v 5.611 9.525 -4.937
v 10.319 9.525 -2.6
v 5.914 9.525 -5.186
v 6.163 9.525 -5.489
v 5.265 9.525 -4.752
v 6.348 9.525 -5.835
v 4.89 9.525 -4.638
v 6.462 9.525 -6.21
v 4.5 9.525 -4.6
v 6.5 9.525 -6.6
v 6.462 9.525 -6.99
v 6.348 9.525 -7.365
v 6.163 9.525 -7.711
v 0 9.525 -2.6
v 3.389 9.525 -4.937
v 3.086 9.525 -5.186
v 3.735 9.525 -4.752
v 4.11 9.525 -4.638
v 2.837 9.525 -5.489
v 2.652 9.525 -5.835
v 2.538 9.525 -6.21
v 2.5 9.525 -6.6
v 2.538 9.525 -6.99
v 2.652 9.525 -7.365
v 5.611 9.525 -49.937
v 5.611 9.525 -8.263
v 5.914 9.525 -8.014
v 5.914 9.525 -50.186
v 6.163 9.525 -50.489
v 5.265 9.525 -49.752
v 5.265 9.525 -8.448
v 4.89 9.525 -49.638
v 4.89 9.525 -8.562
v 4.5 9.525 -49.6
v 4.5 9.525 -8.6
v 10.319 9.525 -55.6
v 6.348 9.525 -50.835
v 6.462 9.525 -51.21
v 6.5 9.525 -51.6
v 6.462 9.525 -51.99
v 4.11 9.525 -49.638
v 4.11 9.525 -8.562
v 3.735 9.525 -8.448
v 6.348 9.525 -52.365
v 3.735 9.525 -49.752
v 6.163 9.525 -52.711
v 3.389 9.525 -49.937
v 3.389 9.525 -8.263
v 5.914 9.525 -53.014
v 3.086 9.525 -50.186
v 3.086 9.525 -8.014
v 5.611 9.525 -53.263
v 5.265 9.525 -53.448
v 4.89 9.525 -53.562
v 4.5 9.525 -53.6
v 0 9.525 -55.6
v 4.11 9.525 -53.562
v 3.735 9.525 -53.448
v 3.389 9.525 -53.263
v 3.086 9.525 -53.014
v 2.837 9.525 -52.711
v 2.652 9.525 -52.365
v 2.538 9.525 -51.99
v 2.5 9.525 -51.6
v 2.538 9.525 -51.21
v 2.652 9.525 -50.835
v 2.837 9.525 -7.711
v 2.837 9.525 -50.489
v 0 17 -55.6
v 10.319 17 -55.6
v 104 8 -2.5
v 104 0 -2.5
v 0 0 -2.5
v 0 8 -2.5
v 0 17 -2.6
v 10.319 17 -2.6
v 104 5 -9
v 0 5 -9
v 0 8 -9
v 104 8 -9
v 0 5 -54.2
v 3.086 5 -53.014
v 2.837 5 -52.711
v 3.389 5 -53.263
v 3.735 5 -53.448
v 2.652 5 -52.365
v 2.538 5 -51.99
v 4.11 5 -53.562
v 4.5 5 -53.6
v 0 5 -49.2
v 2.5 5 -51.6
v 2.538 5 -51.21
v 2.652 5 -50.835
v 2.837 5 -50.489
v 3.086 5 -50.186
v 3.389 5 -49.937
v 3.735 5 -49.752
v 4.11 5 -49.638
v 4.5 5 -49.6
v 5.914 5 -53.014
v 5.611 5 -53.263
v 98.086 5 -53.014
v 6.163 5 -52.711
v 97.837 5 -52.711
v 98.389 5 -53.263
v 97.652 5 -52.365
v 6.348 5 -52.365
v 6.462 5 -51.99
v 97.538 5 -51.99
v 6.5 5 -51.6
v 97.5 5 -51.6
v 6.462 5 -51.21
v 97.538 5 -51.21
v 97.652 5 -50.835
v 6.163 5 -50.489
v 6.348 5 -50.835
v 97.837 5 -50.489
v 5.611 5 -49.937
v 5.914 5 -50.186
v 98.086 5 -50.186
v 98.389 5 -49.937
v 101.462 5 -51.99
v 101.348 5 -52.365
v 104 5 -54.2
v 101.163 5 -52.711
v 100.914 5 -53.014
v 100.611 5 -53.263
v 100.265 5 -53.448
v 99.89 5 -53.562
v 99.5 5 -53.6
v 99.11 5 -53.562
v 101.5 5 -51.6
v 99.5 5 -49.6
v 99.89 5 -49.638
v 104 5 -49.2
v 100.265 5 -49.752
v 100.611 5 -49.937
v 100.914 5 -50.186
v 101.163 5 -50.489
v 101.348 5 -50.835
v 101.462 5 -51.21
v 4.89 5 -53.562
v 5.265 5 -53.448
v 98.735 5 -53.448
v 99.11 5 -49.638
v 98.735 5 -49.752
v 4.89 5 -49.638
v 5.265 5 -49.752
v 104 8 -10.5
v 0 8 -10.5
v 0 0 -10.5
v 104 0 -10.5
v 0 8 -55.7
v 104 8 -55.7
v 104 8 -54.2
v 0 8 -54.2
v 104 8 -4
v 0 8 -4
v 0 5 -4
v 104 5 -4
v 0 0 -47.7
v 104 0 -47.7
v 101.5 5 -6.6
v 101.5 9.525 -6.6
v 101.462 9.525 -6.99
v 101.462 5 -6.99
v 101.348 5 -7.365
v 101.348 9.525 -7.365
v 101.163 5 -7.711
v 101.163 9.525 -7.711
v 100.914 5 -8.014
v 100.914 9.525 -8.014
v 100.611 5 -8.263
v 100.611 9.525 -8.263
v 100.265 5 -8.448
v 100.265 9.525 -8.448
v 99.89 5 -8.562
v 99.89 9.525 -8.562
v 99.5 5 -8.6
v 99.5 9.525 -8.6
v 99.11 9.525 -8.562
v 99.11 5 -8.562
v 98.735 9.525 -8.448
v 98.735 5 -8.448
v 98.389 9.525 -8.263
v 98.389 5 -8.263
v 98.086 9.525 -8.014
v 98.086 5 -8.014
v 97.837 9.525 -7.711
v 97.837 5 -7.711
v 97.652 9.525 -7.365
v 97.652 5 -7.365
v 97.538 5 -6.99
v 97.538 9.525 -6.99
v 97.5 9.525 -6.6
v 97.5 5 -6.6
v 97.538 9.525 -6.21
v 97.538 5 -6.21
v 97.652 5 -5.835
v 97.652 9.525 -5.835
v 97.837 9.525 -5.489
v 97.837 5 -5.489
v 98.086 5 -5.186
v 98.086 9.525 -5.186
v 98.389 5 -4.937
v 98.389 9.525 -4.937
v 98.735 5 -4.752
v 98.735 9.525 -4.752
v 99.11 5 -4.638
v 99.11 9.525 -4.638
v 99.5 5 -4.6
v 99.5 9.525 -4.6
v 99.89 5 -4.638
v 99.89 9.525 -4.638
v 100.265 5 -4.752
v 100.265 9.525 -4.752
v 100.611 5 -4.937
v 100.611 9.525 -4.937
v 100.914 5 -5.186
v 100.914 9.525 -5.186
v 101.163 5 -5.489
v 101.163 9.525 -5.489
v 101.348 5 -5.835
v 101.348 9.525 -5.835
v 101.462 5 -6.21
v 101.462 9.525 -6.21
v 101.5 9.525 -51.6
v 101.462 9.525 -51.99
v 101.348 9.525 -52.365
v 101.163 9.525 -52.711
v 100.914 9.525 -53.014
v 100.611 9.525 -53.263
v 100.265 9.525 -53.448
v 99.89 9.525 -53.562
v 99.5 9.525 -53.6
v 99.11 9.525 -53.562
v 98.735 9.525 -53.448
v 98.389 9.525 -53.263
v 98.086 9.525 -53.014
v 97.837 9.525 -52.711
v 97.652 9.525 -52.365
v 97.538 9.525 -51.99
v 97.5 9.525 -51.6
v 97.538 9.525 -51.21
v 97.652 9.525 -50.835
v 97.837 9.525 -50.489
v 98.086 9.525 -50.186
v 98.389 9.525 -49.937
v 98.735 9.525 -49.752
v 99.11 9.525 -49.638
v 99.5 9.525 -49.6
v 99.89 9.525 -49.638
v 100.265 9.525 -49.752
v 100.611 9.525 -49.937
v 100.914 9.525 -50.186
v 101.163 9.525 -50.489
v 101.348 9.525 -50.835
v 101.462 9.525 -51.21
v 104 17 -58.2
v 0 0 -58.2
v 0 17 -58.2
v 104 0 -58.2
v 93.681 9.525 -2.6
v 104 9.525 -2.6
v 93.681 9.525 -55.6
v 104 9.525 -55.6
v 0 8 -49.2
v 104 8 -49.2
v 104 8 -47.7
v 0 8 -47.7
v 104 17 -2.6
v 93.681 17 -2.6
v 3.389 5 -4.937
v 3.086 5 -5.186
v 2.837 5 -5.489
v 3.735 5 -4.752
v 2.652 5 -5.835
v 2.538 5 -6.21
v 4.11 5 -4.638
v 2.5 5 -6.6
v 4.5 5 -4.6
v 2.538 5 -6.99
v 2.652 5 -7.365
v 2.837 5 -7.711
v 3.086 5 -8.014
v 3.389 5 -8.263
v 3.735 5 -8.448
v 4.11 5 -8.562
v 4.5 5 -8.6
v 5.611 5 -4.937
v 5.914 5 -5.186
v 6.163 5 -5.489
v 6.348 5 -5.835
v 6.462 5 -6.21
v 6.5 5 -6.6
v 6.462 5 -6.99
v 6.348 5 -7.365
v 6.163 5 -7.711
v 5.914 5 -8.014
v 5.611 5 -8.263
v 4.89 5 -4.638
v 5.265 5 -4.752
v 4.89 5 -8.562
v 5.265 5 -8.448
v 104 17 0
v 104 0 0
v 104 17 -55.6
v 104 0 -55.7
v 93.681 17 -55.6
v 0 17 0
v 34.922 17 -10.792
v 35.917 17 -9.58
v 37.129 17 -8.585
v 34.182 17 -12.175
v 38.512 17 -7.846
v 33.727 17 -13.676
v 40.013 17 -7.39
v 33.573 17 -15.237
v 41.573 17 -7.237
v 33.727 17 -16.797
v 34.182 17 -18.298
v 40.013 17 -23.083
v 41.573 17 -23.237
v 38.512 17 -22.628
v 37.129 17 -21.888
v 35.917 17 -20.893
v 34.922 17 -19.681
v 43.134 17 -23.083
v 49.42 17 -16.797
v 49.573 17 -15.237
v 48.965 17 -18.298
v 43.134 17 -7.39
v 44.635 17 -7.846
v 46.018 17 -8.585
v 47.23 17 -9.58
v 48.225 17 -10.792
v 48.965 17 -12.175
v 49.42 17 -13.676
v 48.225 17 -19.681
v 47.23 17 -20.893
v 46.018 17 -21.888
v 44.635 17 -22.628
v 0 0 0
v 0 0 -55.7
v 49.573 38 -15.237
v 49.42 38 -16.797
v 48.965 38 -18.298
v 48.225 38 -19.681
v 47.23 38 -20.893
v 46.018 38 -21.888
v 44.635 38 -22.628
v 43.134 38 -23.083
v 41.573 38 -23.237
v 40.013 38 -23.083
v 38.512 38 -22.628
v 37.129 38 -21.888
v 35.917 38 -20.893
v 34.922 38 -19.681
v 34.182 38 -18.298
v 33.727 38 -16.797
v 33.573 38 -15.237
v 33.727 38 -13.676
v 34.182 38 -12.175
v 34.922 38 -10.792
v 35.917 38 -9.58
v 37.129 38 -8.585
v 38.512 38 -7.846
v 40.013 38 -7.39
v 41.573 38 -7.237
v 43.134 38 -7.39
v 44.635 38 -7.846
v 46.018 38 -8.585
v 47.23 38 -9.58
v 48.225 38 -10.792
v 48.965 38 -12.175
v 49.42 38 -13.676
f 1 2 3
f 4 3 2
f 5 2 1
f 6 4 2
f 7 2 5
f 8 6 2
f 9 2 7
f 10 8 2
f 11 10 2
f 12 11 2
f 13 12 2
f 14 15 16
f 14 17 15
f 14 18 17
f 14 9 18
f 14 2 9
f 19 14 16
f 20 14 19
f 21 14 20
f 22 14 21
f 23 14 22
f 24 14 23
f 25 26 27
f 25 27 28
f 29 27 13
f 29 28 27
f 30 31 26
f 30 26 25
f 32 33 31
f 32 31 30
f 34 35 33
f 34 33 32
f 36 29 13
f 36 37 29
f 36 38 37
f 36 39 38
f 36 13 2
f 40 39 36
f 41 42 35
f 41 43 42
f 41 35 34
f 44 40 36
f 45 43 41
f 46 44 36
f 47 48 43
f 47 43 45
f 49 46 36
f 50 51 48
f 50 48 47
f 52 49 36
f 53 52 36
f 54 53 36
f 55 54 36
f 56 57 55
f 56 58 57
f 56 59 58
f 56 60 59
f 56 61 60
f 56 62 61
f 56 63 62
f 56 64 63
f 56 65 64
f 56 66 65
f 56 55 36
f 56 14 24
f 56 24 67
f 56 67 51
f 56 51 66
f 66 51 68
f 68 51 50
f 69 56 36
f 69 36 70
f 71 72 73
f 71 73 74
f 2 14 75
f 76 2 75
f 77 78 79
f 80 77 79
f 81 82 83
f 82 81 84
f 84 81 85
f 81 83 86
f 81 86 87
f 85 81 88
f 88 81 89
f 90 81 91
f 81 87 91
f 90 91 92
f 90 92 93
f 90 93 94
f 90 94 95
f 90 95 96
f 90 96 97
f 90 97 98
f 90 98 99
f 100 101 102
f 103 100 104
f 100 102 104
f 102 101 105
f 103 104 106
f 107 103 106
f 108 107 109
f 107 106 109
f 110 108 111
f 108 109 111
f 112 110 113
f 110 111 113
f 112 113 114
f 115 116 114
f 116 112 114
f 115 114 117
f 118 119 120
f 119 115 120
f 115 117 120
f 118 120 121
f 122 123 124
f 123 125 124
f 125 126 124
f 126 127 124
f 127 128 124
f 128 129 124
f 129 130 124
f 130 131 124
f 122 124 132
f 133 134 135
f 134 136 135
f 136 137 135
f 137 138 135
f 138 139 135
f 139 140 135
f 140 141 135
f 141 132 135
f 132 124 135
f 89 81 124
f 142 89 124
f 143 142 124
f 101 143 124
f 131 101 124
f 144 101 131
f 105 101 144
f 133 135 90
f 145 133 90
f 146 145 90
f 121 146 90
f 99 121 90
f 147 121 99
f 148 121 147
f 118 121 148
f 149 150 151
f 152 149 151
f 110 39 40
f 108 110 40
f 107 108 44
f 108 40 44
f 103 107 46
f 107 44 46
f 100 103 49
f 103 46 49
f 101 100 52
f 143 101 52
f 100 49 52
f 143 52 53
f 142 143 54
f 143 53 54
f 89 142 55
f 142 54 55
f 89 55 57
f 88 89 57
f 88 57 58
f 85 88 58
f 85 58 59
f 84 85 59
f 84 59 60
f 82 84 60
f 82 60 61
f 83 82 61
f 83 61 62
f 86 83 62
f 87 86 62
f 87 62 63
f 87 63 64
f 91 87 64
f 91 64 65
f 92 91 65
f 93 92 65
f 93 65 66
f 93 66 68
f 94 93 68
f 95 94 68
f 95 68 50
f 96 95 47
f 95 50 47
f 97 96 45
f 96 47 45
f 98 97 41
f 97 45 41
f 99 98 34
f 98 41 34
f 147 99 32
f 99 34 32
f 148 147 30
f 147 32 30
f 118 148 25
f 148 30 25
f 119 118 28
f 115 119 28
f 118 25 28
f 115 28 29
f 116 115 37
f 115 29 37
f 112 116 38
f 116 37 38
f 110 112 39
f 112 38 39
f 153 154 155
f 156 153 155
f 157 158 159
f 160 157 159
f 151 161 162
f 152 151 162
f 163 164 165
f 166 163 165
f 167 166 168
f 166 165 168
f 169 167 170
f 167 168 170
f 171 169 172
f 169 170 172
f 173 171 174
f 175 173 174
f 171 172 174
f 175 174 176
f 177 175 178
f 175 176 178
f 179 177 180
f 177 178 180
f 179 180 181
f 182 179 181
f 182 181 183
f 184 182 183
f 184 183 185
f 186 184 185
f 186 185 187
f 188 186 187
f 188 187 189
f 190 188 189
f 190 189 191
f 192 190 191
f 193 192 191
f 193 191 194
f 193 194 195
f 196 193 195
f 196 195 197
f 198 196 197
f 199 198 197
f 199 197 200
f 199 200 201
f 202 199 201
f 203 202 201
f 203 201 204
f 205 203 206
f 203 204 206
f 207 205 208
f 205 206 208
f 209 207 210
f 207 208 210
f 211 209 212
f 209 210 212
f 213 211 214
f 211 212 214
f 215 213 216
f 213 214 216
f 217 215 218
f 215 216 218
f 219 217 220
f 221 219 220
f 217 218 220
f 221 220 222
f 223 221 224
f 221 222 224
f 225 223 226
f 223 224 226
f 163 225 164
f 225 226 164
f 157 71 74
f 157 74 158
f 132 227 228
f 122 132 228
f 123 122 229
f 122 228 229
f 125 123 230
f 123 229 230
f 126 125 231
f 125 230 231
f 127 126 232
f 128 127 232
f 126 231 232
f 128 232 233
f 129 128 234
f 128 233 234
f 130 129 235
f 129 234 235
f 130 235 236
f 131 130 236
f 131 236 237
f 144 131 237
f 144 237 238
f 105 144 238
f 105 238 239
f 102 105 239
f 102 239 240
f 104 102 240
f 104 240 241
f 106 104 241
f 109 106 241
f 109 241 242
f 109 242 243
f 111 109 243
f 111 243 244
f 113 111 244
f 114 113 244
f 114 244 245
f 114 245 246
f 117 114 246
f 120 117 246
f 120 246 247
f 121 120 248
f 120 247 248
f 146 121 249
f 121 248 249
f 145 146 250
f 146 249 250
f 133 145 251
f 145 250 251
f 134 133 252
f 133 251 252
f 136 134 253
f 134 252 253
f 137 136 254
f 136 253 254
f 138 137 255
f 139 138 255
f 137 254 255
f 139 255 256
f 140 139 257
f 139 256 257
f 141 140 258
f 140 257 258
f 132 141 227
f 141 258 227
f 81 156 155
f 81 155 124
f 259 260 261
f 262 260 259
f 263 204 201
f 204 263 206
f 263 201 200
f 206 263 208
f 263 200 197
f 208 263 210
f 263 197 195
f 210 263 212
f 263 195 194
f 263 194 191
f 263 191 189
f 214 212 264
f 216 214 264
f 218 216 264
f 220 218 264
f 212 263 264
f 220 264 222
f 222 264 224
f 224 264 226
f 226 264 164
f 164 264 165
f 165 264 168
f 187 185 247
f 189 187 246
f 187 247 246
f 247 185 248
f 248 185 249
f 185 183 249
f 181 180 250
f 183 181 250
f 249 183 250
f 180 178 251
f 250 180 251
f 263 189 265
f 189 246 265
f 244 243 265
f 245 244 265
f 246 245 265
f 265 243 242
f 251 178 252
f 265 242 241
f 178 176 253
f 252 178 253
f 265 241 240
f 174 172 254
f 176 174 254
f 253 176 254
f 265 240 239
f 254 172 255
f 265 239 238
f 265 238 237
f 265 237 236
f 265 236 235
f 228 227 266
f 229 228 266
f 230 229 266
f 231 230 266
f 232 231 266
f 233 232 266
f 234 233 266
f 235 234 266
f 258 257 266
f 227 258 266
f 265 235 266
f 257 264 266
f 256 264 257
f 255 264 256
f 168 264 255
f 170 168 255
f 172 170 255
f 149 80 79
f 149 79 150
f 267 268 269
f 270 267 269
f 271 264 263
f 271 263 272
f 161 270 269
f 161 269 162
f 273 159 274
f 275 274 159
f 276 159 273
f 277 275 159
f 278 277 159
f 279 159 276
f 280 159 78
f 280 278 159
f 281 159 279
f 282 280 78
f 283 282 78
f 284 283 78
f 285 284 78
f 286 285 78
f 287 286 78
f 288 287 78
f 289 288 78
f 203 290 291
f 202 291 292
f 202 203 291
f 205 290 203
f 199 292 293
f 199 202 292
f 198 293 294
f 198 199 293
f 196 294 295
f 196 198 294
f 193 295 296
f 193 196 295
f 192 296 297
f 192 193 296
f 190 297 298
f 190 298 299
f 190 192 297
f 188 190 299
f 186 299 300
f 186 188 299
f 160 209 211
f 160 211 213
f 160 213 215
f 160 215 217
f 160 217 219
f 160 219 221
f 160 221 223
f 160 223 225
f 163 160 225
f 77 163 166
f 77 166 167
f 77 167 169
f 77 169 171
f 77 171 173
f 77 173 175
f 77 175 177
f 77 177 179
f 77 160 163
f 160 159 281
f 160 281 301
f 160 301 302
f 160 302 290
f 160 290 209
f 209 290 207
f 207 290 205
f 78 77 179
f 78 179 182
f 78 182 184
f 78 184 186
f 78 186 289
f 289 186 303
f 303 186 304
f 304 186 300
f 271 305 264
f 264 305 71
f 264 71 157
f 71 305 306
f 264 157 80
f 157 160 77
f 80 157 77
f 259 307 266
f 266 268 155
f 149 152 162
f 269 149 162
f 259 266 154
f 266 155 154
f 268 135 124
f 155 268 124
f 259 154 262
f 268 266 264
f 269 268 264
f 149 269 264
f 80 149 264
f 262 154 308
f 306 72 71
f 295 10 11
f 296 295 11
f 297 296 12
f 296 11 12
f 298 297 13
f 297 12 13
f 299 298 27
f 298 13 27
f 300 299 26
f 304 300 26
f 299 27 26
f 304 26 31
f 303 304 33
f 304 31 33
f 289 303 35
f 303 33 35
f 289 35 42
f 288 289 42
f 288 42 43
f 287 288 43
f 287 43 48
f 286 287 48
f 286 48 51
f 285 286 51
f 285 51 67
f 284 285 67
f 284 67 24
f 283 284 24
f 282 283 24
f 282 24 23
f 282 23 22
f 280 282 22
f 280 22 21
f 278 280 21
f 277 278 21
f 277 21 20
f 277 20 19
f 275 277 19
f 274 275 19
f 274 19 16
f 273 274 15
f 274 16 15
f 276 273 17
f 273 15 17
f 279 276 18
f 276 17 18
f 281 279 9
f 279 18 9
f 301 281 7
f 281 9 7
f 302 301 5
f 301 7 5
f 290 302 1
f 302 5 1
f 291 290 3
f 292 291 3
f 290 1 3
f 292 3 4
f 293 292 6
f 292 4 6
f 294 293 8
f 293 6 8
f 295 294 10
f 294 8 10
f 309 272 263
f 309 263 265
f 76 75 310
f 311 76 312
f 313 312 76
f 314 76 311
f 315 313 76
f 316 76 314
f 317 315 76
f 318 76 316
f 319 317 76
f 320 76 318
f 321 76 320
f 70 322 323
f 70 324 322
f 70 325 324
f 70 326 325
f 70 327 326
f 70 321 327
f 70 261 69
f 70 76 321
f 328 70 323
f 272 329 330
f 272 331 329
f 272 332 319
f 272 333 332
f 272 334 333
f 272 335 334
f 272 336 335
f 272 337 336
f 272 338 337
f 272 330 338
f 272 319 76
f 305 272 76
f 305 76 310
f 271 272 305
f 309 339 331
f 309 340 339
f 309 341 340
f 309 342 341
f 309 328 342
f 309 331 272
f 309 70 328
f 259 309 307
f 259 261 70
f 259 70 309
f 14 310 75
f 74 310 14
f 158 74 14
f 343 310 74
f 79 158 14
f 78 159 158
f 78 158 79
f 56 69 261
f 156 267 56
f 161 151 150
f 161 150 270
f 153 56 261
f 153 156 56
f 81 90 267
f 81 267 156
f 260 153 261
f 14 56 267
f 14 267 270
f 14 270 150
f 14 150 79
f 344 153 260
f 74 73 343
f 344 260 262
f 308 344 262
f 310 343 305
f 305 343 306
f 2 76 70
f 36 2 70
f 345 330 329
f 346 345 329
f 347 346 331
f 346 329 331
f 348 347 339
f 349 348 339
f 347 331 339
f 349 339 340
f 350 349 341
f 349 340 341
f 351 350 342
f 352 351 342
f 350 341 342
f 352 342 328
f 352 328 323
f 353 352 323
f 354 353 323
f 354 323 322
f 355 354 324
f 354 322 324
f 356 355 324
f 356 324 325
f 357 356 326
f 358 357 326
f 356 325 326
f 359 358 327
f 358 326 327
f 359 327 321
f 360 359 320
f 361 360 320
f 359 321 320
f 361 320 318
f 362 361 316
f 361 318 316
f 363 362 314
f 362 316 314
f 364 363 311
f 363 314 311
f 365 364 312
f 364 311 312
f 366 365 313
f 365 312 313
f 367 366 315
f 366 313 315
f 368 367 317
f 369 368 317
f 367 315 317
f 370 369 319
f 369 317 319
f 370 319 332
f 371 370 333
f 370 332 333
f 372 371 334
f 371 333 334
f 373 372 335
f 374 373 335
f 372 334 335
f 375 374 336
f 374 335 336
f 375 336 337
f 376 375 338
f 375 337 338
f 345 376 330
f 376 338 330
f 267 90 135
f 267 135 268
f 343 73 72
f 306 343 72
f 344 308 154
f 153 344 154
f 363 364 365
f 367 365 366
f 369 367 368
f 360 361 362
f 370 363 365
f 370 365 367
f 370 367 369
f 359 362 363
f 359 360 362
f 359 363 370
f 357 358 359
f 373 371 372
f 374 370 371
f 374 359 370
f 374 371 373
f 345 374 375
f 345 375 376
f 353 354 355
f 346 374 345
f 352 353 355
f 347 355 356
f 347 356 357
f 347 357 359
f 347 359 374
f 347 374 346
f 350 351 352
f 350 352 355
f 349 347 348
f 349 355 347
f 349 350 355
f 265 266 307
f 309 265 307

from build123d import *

# Parameters (mm, degrees)
SKETCH1_W             = 104
SKETCH1_H             = 58.2
BOSS_EXTRUDE1_DEPTH   = 17
CUT_EXTRUDE2_DEPTH    = 105
SKETCH3_R             = 8
BOSS_EXTRUDE2_DEPTH   = 21
F_4_0MM_DOWEL_HOLE1_D = 4
SKETCH6_W             = 53
SKETCH6_H             = 7.475
CUT_EXTRUDE3_DEPTH    = 10.31875


with BuildPart() as part:
    # Sketch1 → Boss-Extrude1 (new body)
    with BuildSketch(Plane(origin=(0, 0, 0), x_dir=(1, 0, 0), z_dir=(0, 1, 0))):
        with Locations((52, 29.1)):
            Rectangle(SKETCH1_W, SKETCH1_H)
    extrude(amount=BOSS_EXTRUDE1_DEPTH)

    # Sketch2 → Cut-Extrude2 (cut, through all)
    with BuildSketch(Plane(origin=(104, 0, 0), x_dir=(0, 0, -1), z_dir=(1, 0, 0))):
        Polygon((2.5, 0), (2.5, 8), (4, 8), (4, 5), (9, 5), (9, 8), (10.5, 8), (10.5, 0), align=None)
        Polygon((47.7, 8), (47.7, 0), (55.7, 0), (55.7, 8), (54.2, 8), (54.2, 5), (49.2, 5), (49.2, 8), align=None)
    extrude(amount=-CUT_EXTRUDE2_DEPTH, mode=Mode.SUBTRACT)

    # Sketch3 → Boss-Extrude2 (add)
    with BuildSketch(Plane(origin=(0, 17, 0), x_dir=(1, 0, 0), z_dir=(0, 1, 0))):
        with Locations((41.573485345, 15.236601424)):
            Circle(SKETCH3_R)
    extrude(amount=BOSS_EXTRUDE2_DEPTH)

    # Ø4.0mm Dowel Hole1 (through all)
    with Locations(Plane(origin=(0, 5, 0), x_dir=(-1, 0, 0), z_dir=(0, -1, 0))):
        with Locations((-4.5, 51.6), (-4.5, 6.6), (-99.5, 6.6), (-99.5, 51.6)):
            Hole(F_4_0MM_DOWEL_HOLE1_D / 2)

    # Sketch6 → Cut-Extrude3 (cut)
    with BuildSketch(Plane(origin=(104, 0, 0), x_dir=(0, 0, -1), z_dir=(1, 0, 0))):
        with Locations((29.1, 13.2625)):
            Rectangle(SKETCH6_W, SKETCH6_H)
    cut_extrude3 = extrude(amount=-CUT_EXTRUDE3_DEPTH, mode=Mode.SUBTRACT)

    # Mirror1: Cut-Extrude3 across plane
    add(cut_extrude3.mirror(Plane.ZY.offset(-52.00000014)), mode=Mode.SUBTRACT)


solid = part.part
